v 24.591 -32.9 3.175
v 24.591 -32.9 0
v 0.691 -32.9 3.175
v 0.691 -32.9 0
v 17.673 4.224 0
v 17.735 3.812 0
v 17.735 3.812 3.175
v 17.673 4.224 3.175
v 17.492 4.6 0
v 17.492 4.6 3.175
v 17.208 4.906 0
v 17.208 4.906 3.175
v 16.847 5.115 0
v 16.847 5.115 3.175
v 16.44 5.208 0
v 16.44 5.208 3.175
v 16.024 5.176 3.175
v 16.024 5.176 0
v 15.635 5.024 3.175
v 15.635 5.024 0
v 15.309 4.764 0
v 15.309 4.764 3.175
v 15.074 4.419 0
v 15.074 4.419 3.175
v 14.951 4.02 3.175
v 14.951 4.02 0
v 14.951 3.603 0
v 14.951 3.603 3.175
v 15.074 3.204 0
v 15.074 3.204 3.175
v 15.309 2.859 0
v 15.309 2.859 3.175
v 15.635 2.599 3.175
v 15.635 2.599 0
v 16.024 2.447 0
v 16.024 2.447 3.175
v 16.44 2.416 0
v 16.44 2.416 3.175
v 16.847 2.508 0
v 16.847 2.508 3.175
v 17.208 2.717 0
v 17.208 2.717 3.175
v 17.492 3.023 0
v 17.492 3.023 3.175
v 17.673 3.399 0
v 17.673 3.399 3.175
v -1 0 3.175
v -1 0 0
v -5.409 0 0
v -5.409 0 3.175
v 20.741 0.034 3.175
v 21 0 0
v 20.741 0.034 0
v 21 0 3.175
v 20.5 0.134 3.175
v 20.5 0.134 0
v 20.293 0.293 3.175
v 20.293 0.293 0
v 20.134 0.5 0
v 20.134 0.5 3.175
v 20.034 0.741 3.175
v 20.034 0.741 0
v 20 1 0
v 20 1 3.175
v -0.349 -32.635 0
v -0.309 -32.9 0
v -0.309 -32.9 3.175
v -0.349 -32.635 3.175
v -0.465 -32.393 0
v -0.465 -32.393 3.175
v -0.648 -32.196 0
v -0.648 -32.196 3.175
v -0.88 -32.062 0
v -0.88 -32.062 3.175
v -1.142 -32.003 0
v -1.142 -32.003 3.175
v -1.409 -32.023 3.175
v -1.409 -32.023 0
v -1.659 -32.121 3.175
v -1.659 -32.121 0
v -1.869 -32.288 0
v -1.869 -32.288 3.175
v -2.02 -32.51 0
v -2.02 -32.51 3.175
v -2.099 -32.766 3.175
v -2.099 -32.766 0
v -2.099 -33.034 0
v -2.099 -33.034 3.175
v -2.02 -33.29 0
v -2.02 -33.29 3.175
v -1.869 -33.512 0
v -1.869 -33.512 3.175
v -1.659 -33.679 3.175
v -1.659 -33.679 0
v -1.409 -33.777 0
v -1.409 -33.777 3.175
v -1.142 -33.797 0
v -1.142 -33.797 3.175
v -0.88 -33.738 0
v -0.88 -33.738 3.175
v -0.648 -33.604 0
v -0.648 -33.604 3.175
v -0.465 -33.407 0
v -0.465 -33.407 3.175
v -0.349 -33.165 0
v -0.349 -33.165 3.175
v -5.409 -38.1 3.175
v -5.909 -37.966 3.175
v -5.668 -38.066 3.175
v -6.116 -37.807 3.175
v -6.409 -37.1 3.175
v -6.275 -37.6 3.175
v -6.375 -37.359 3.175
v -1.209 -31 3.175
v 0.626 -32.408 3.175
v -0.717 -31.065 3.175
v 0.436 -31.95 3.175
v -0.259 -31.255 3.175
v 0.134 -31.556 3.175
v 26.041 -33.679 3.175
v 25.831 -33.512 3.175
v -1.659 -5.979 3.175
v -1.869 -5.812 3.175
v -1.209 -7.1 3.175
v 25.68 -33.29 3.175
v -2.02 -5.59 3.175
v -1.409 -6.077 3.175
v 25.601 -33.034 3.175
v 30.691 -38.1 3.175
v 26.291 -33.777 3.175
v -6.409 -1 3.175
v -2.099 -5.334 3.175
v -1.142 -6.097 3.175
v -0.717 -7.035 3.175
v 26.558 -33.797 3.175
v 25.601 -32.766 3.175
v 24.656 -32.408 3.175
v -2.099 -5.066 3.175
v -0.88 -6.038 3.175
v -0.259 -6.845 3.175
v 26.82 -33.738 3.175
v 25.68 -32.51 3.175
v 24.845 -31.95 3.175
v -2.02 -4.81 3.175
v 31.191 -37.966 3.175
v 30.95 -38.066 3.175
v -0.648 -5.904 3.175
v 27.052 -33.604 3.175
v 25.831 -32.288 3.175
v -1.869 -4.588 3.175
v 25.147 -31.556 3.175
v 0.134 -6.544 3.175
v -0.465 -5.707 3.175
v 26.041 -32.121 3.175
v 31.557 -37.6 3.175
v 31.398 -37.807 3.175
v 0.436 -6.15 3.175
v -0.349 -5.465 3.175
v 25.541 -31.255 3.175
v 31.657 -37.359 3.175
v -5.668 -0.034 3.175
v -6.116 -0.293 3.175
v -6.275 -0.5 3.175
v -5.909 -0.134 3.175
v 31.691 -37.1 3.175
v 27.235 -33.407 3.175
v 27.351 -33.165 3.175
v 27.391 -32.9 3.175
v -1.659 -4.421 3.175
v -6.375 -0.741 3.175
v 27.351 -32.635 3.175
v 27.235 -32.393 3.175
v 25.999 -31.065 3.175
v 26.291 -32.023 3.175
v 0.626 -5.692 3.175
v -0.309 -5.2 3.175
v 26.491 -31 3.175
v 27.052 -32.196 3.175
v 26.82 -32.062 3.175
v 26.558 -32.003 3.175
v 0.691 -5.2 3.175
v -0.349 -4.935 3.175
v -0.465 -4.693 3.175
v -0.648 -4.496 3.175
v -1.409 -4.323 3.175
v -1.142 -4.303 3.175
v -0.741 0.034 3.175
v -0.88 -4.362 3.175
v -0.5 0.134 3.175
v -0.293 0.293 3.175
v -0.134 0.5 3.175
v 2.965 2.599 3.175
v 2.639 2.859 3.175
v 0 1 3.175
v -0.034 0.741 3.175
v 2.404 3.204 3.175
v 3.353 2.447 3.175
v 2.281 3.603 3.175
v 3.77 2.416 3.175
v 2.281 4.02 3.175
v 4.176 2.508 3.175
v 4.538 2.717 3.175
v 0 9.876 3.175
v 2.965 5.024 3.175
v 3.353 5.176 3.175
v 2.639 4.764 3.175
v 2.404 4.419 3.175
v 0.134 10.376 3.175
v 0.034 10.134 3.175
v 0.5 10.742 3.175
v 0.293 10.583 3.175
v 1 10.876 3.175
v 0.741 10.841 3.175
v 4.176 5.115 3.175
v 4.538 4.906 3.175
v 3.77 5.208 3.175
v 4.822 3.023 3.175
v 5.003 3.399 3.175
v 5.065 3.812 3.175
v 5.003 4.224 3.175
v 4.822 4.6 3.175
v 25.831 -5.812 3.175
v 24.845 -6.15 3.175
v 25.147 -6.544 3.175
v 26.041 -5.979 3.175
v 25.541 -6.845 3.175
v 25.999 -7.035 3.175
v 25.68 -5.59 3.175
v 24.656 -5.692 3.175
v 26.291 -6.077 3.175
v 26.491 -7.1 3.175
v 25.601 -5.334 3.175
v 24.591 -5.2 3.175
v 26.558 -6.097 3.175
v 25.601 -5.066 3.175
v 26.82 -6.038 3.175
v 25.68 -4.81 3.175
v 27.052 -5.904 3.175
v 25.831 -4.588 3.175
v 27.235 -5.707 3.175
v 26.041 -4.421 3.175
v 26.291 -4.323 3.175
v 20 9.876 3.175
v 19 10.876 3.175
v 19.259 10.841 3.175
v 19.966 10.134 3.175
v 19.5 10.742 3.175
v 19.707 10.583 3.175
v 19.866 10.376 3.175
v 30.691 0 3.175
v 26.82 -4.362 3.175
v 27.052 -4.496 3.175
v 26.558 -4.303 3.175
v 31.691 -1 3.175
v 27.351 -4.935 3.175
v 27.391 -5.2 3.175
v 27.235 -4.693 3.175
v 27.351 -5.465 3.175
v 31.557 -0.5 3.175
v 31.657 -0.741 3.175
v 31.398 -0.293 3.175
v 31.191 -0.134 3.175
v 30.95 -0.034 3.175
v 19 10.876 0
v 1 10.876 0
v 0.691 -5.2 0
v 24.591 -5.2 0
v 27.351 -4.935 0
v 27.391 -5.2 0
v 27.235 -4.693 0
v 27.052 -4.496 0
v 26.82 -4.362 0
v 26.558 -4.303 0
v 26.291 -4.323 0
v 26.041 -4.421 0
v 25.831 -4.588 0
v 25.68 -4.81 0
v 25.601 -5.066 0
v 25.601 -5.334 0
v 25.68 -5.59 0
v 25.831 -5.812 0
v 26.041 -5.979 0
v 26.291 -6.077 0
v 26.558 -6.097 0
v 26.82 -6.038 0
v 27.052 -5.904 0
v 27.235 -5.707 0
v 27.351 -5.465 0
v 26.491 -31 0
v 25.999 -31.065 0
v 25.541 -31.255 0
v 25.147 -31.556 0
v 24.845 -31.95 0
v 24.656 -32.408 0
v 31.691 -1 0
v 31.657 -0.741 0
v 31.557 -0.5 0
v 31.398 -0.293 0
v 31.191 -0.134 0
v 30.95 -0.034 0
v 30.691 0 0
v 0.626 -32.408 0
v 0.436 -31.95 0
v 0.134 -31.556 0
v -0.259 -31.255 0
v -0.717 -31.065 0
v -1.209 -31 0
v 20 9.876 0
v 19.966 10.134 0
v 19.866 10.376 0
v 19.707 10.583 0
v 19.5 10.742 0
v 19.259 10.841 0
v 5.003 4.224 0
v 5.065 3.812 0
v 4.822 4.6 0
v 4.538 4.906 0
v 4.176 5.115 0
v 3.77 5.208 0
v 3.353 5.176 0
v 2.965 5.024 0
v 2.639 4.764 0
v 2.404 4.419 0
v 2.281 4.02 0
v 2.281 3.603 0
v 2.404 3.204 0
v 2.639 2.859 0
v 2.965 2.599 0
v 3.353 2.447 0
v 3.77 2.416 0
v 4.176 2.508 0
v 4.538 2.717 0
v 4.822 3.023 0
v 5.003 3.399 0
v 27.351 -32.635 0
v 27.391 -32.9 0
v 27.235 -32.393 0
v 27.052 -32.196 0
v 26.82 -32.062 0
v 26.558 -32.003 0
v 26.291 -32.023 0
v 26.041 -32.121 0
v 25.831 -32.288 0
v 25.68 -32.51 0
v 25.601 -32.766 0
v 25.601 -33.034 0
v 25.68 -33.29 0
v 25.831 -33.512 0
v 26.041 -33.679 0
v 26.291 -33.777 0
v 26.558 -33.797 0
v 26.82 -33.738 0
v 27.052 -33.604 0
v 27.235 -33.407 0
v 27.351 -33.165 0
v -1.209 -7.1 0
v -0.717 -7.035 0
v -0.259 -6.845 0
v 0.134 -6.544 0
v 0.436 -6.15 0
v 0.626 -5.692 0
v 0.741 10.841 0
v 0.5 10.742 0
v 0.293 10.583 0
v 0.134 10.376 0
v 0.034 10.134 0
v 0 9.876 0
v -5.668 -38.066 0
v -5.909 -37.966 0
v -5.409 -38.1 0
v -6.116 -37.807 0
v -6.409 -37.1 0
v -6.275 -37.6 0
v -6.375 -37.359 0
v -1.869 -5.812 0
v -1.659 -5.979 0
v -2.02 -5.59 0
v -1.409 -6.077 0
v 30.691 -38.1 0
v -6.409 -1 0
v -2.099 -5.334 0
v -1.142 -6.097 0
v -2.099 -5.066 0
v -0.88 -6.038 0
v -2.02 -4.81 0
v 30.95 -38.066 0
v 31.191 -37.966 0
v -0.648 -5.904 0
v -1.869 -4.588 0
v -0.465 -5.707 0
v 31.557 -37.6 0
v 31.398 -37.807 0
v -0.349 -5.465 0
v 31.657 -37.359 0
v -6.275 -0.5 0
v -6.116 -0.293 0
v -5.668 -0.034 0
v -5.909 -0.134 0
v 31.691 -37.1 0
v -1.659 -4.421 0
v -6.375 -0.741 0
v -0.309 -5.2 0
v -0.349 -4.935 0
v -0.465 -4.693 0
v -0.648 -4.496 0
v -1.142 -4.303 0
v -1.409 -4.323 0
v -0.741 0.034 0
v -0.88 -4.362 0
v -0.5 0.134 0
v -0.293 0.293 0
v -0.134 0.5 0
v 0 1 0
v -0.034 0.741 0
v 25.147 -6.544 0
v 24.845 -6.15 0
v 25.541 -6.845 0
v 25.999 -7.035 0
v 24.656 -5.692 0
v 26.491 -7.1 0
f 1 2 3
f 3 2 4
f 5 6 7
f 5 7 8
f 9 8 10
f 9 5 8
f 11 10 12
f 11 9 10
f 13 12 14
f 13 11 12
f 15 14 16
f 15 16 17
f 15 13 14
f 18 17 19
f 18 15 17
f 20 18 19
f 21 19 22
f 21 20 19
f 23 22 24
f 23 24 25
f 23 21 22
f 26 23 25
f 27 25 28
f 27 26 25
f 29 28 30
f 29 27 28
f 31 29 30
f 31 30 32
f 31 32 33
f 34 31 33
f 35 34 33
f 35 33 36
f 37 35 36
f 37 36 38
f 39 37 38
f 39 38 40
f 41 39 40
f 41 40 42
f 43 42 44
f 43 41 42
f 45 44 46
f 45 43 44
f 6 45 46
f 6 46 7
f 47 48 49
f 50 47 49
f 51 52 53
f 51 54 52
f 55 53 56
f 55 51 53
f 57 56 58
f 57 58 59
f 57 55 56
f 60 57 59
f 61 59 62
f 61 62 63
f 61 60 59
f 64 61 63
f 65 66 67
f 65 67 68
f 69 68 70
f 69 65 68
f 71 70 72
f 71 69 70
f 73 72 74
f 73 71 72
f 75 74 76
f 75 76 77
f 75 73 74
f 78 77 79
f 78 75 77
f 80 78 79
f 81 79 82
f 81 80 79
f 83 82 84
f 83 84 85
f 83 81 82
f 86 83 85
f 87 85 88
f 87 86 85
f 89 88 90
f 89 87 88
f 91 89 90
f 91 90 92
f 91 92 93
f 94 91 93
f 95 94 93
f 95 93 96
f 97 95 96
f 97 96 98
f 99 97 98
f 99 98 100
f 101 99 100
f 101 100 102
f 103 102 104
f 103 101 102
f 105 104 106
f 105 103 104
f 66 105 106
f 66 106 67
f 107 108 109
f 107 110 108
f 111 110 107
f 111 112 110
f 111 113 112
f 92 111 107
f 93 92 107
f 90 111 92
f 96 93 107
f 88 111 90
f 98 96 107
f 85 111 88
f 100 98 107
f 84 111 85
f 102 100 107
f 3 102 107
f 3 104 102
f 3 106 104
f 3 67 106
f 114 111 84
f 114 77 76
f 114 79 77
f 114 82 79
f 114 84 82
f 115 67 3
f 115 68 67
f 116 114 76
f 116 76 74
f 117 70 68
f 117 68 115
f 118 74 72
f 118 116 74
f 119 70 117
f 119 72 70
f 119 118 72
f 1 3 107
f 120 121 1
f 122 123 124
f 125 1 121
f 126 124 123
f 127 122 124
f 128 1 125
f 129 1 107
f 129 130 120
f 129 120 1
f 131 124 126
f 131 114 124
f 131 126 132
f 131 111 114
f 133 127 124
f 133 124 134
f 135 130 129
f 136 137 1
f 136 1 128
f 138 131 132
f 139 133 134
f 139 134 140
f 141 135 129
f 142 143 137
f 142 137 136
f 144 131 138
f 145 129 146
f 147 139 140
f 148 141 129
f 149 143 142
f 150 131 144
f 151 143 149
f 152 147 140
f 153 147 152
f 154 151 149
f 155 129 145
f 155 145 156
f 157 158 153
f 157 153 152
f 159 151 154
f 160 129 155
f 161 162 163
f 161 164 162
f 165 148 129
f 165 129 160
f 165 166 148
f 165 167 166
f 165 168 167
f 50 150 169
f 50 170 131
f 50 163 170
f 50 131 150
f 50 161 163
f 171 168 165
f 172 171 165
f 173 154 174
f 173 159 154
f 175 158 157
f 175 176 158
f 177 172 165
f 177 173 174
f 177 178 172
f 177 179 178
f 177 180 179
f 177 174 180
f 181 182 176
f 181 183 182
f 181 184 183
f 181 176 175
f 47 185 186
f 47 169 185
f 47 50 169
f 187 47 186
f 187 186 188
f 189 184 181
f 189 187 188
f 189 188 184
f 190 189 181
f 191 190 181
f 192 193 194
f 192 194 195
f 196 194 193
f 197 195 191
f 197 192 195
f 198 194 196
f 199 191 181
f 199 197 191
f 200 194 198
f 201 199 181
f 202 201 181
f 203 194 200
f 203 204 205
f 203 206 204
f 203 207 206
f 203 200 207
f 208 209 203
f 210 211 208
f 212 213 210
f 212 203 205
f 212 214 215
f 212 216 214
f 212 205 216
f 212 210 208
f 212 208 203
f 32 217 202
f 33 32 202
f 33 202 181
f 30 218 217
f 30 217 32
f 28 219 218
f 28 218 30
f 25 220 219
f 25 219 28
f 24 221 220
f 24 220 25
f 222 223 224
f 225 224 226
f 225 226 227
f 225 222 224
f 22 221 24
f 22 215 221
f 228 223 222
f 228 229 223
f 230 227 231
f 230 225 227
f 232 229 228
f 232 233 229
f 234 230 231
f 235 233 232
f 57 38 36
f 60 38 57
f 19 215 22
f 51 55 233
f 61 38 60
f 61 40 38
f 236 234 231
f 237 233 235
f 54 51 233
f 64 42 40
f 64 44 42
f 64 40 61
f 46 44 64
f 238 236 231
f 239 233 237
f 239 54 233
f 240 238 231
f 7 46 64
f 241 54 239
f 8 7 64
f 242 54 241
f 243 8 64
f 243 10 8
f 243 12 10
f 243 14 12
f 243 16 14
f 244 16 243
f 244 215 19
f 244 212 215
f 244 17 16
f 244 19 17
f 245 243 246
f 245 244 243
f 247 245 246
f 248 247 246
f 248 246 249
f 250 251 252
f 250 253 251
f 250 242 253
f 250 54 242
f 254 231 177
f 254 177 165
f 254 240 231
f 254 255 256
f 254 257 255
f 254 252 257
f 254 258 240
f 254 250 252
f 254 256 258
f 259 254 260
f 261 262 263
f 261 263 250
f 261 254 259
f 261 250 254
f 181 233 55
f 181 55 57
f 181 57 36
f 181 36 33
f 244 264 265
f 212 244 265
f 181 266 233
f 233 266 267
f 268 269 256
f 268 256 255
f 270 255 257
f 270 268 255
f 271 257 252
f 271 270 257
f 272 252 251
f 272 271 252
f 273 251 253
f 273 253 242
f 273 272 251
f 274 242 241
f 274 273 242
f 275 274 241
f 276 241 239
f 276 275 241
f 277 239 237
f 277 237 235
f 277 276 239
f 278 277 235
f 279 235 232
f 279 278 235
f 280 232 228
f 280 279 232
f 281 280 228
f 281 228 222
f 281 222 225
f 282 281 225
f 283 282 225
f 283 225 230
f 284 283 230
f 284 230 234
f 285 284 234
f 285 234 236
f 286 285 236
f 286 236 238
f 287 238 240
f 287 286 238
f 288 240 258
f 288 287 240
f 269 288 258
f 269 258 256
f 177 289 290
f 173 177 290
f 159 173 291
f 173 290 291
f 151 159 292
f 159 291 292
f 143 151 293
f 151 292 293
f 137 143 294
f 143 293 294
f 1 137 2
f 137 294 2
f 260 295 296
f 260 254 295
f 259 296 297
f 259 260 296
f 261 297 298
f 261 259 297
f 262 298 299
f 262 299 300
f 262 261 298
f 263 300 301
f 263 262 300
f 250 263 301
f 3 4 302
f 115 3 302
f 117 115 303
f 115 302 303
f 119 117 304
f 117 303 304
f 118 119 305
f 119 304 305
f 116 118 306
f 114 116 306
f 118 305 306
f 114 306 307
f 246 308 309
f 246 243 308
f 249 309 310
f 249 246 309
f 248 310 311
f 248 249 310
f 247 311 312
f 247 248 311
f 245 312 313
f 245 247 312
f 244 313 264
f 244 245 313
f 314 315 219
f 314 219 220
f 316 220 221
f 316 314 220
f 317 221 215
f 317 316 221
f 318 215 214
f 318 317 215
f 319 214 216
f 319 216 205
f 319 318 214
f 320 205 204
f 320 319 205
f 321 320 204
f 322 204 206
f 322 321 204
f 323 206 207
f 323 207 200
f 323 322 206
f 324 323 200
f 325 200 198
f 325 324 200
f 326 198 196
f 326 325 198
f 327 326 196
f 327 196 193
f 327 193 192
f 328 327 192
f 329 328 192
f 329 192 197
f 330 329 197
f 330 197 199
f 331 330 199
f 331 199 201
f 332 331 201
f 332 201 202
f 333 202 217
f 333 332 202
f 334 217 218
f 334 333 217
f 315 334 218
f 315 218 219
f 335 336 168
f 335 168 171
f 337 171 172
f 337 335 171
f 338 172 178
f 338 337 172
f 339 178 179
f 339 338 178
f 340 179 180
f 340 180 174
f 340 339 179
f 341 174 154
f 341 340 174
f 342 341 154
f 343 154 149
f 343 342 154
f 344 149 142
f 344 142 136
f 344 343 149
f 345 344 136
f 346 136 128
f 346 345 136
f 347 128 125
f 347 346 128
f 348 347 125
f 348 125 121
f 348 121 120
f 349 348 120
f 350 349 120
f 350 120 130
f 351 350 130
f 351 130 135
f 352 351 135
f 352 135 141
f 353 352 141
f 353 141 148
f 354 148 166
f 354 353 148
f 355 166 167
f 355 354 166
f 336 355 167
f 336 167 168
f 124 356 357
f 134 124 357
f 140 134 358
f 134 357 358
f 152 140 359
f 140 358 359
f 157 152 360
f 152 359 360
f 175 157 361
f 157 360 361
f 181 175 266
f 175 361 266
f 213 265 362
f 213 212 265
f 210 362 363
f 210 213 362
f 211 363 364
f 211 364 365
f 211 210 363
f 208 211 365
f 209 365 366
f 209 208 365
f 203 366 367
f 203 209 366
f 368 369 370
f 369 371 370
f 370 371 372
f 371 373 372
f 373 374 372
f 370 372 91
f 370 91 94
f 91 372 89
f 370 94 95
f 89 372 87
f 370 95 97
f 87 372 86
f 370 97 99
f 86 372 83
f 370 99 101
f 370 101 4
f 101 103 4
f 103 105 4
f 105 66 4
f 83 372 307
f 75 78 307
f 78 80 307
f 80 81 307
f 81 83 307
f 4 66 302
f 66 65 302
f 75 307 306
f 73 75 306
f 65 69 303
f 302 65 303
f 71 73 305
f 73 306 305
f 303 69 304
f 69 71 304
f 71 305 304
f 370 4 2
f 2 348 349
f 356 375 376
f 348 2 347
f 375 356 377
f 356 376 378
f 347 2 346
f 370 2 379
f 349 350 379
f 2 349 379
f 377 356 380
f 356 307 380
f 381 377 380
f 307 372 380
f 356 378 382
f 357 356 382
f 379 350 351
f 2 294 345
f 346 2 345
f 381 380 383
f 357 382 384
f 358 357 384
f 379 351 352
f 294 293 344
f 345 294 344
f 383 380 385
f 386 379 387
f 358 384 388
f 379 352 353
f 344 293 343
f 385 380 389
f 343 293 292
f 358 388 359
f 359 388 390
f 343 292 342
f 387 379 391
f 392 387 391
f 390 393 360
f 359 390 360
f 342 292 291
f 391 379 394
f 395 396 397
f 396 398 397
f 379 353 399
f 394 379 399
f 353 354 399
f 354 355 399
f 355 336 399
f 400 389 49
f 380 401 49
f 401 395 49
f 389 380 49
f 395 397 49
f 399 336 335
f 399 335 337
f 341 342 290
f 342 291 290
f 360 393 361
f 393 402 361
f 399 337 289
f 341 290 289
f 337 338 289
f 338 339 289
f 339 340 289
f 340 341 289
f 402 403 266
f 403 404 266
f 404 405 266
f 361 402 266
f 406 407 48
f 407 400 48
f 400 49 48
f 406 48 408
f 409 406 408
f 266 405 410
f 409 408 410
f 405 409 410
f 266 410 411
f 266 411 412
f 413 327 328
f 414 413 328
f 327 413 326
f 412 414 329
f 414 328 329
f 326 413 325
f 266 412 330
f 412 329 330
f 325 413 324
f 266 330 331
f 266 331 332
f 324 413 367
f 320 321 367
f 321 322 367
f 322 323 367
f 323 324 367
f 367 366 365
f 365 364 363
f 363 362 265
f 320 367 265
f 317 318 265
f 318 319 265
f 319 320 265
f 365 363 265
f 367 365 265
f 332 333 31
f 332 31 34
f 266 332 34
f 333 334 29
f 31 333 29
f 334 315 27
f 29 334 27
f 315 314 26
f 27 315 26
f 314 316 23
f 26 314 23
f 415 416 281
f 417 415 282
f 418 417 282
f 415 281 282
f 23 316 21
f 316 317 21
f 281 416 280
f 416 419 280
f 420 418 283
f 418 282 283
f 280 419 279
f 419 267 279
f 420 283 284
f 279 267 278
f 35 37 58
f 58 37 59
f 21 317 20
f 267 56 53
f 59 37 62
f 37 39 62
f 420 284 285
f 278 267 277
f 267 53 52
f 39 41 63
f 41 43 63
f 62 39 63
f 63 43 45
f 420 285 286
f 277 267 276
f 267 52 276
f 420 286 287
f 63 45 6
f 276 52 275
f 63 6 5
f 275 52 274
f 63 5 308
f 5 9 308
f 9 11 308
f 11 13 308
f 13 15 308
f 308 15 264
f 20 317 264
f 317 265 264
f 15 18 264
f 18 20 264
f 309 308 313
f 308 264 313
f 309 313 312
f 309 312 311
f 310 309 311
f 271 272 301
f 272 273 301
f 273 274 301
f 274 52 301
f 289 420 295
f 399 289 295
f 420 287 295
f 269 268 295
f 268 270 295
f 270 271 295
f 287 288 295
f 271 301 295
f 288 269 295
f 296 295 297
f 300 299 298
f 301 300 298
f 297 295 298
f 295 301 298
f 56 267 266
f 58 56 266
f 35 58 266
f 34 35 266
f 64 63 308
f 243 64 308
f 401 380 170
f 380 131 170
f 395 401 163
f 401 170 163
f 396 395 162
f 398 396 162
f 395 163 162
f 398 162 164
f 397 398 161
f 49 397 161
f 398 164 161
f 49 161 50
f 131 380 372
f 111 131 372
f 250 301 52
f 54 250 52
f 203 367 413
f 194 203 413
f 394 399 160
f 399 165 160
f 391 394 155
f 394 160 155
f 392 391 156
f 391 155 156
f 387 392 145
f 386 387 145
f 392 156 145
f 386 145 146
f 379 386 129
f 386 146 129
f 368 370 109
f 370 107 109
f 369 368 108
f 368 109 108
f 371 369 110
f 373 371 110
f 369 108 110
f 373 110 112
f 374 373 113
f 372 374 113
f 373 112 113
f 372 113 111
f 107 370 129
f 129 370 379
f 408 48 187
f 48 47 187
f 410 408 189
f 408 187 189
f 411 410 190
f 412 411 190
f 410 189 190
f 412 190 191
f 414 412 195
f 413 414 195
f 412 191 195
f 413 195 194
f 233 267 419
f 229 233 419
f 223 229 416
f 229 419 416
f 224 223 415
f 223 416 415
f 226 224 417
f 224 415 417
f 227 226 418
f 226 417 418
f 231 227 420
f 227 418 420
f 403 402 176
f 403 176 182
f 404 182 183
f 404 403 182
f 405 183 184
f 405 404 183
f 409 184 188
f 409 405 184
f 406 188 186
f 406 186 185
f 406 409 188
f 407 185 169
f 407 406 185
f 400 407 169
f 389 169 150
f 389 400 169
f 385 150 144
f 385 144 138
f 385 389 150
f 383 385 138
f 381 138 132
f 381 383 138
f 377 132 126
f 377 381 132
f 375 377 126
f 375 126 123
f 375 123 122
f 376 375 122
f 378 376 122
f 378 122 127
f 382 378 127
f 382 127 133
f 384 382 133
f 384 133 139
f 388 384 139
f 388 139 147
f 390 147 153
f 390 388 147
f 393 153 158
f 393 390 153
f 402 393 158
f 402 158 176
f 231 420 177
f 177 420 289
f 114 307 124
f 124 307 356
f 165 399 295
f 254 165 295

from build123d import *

# Parameters (mm, degrees)
SKETCH1_R           = 0.9
SKETCH1_R_2         = 1.4
BOSS_EXTRUDE1_DEPTH = 3.175
FILLET1_R           = 1


with BuildPart() as part:
    # Sketch1 → Boss-Extrude1 (new body)
    with BuildSketch(Plane.XY):
        Polygon((31.690894529, -38.1), (31.690894529, 0), (20, 0), (20, 10.87553853), (0, 10.87553853), (0, 0), (-6.409105471, 0), (-6.409105471, -38.1), align=None)
        with Locations((26.490894529, -32.9)):
            Circle(SKETCH1_R, mode=Mode.SUBTRACT)
        with Locations((-1.209105471, -32.9)):
            Circle(SKETCH1_R, mode=Mode.SUBTRACT)
        with Locations((-1.209105471, -5.2)):
            Circle(SKETCH1_R, mode=Mode.SUBTRACT)
        with Locations((26.490894529, -5.2)):
            Circle(SKETCH1_R, mode=Mode.SUBTRACT)
        with Locations((16.335044769, 3.811593223)):
            Circle(SKETCH1_R_2, mode=Mode.SUBTRACT)
        with Locations((3.664955231, 3.811593223)):
            Circle(SKETCH1_R_2, mode=Mode.SUBTRACT)
        with BuildLine():
            Line((26.490894529, -7.1), (26.490894529, -31))
            ThreePointArc((26.490894529, -31), (25.147391645, -31.556497116), (24.590894529, -32.9))
            Line((24.590894529, -32.9), (0.690894529, -32.9))
            ThreePointArc((0.690894529, -32.9), (0.134397413, -31.556497116), (-1.209105471, -31))
            Line((-1.209105471, -31), (-1.209105471, -7.1))
            ThreePointArc((-1.209105471, -7.1), (0.134397413, -6.543502884), (0.690894529, -5.2))
            Line((0.690894529, -5.2), (24.590894529, -5.2))
            ThreePointArc((24.590894529, -5.2), (25.147391645, -6.543502884), (26.490894529, -7.1))
        make_face(mode=Mode.SUBTRACT)
    extrude(amount=BOSS_EXTRUDE1_DEPTH)

    # Fillet1
    fillet1_edges = [part.edges().sort_by_distance(p)[0] for p in [
        (20, 10.87553853, 1.5875),
        (20, 0, 1.5875),
        (31.690894529, 0, 1.5875),
        (31.690894529, -38.1, 1.5875),
        (-6.409105471, -38.1, 1.5875),
        (-6.409105471, 0, 1.5875),
        (0, 0, 1.5875),
        (0, 10.87553853, 1.5875),
    ]]
    fillet(fillet1_edges, radius=FILLET1_R)


solid = part.part
